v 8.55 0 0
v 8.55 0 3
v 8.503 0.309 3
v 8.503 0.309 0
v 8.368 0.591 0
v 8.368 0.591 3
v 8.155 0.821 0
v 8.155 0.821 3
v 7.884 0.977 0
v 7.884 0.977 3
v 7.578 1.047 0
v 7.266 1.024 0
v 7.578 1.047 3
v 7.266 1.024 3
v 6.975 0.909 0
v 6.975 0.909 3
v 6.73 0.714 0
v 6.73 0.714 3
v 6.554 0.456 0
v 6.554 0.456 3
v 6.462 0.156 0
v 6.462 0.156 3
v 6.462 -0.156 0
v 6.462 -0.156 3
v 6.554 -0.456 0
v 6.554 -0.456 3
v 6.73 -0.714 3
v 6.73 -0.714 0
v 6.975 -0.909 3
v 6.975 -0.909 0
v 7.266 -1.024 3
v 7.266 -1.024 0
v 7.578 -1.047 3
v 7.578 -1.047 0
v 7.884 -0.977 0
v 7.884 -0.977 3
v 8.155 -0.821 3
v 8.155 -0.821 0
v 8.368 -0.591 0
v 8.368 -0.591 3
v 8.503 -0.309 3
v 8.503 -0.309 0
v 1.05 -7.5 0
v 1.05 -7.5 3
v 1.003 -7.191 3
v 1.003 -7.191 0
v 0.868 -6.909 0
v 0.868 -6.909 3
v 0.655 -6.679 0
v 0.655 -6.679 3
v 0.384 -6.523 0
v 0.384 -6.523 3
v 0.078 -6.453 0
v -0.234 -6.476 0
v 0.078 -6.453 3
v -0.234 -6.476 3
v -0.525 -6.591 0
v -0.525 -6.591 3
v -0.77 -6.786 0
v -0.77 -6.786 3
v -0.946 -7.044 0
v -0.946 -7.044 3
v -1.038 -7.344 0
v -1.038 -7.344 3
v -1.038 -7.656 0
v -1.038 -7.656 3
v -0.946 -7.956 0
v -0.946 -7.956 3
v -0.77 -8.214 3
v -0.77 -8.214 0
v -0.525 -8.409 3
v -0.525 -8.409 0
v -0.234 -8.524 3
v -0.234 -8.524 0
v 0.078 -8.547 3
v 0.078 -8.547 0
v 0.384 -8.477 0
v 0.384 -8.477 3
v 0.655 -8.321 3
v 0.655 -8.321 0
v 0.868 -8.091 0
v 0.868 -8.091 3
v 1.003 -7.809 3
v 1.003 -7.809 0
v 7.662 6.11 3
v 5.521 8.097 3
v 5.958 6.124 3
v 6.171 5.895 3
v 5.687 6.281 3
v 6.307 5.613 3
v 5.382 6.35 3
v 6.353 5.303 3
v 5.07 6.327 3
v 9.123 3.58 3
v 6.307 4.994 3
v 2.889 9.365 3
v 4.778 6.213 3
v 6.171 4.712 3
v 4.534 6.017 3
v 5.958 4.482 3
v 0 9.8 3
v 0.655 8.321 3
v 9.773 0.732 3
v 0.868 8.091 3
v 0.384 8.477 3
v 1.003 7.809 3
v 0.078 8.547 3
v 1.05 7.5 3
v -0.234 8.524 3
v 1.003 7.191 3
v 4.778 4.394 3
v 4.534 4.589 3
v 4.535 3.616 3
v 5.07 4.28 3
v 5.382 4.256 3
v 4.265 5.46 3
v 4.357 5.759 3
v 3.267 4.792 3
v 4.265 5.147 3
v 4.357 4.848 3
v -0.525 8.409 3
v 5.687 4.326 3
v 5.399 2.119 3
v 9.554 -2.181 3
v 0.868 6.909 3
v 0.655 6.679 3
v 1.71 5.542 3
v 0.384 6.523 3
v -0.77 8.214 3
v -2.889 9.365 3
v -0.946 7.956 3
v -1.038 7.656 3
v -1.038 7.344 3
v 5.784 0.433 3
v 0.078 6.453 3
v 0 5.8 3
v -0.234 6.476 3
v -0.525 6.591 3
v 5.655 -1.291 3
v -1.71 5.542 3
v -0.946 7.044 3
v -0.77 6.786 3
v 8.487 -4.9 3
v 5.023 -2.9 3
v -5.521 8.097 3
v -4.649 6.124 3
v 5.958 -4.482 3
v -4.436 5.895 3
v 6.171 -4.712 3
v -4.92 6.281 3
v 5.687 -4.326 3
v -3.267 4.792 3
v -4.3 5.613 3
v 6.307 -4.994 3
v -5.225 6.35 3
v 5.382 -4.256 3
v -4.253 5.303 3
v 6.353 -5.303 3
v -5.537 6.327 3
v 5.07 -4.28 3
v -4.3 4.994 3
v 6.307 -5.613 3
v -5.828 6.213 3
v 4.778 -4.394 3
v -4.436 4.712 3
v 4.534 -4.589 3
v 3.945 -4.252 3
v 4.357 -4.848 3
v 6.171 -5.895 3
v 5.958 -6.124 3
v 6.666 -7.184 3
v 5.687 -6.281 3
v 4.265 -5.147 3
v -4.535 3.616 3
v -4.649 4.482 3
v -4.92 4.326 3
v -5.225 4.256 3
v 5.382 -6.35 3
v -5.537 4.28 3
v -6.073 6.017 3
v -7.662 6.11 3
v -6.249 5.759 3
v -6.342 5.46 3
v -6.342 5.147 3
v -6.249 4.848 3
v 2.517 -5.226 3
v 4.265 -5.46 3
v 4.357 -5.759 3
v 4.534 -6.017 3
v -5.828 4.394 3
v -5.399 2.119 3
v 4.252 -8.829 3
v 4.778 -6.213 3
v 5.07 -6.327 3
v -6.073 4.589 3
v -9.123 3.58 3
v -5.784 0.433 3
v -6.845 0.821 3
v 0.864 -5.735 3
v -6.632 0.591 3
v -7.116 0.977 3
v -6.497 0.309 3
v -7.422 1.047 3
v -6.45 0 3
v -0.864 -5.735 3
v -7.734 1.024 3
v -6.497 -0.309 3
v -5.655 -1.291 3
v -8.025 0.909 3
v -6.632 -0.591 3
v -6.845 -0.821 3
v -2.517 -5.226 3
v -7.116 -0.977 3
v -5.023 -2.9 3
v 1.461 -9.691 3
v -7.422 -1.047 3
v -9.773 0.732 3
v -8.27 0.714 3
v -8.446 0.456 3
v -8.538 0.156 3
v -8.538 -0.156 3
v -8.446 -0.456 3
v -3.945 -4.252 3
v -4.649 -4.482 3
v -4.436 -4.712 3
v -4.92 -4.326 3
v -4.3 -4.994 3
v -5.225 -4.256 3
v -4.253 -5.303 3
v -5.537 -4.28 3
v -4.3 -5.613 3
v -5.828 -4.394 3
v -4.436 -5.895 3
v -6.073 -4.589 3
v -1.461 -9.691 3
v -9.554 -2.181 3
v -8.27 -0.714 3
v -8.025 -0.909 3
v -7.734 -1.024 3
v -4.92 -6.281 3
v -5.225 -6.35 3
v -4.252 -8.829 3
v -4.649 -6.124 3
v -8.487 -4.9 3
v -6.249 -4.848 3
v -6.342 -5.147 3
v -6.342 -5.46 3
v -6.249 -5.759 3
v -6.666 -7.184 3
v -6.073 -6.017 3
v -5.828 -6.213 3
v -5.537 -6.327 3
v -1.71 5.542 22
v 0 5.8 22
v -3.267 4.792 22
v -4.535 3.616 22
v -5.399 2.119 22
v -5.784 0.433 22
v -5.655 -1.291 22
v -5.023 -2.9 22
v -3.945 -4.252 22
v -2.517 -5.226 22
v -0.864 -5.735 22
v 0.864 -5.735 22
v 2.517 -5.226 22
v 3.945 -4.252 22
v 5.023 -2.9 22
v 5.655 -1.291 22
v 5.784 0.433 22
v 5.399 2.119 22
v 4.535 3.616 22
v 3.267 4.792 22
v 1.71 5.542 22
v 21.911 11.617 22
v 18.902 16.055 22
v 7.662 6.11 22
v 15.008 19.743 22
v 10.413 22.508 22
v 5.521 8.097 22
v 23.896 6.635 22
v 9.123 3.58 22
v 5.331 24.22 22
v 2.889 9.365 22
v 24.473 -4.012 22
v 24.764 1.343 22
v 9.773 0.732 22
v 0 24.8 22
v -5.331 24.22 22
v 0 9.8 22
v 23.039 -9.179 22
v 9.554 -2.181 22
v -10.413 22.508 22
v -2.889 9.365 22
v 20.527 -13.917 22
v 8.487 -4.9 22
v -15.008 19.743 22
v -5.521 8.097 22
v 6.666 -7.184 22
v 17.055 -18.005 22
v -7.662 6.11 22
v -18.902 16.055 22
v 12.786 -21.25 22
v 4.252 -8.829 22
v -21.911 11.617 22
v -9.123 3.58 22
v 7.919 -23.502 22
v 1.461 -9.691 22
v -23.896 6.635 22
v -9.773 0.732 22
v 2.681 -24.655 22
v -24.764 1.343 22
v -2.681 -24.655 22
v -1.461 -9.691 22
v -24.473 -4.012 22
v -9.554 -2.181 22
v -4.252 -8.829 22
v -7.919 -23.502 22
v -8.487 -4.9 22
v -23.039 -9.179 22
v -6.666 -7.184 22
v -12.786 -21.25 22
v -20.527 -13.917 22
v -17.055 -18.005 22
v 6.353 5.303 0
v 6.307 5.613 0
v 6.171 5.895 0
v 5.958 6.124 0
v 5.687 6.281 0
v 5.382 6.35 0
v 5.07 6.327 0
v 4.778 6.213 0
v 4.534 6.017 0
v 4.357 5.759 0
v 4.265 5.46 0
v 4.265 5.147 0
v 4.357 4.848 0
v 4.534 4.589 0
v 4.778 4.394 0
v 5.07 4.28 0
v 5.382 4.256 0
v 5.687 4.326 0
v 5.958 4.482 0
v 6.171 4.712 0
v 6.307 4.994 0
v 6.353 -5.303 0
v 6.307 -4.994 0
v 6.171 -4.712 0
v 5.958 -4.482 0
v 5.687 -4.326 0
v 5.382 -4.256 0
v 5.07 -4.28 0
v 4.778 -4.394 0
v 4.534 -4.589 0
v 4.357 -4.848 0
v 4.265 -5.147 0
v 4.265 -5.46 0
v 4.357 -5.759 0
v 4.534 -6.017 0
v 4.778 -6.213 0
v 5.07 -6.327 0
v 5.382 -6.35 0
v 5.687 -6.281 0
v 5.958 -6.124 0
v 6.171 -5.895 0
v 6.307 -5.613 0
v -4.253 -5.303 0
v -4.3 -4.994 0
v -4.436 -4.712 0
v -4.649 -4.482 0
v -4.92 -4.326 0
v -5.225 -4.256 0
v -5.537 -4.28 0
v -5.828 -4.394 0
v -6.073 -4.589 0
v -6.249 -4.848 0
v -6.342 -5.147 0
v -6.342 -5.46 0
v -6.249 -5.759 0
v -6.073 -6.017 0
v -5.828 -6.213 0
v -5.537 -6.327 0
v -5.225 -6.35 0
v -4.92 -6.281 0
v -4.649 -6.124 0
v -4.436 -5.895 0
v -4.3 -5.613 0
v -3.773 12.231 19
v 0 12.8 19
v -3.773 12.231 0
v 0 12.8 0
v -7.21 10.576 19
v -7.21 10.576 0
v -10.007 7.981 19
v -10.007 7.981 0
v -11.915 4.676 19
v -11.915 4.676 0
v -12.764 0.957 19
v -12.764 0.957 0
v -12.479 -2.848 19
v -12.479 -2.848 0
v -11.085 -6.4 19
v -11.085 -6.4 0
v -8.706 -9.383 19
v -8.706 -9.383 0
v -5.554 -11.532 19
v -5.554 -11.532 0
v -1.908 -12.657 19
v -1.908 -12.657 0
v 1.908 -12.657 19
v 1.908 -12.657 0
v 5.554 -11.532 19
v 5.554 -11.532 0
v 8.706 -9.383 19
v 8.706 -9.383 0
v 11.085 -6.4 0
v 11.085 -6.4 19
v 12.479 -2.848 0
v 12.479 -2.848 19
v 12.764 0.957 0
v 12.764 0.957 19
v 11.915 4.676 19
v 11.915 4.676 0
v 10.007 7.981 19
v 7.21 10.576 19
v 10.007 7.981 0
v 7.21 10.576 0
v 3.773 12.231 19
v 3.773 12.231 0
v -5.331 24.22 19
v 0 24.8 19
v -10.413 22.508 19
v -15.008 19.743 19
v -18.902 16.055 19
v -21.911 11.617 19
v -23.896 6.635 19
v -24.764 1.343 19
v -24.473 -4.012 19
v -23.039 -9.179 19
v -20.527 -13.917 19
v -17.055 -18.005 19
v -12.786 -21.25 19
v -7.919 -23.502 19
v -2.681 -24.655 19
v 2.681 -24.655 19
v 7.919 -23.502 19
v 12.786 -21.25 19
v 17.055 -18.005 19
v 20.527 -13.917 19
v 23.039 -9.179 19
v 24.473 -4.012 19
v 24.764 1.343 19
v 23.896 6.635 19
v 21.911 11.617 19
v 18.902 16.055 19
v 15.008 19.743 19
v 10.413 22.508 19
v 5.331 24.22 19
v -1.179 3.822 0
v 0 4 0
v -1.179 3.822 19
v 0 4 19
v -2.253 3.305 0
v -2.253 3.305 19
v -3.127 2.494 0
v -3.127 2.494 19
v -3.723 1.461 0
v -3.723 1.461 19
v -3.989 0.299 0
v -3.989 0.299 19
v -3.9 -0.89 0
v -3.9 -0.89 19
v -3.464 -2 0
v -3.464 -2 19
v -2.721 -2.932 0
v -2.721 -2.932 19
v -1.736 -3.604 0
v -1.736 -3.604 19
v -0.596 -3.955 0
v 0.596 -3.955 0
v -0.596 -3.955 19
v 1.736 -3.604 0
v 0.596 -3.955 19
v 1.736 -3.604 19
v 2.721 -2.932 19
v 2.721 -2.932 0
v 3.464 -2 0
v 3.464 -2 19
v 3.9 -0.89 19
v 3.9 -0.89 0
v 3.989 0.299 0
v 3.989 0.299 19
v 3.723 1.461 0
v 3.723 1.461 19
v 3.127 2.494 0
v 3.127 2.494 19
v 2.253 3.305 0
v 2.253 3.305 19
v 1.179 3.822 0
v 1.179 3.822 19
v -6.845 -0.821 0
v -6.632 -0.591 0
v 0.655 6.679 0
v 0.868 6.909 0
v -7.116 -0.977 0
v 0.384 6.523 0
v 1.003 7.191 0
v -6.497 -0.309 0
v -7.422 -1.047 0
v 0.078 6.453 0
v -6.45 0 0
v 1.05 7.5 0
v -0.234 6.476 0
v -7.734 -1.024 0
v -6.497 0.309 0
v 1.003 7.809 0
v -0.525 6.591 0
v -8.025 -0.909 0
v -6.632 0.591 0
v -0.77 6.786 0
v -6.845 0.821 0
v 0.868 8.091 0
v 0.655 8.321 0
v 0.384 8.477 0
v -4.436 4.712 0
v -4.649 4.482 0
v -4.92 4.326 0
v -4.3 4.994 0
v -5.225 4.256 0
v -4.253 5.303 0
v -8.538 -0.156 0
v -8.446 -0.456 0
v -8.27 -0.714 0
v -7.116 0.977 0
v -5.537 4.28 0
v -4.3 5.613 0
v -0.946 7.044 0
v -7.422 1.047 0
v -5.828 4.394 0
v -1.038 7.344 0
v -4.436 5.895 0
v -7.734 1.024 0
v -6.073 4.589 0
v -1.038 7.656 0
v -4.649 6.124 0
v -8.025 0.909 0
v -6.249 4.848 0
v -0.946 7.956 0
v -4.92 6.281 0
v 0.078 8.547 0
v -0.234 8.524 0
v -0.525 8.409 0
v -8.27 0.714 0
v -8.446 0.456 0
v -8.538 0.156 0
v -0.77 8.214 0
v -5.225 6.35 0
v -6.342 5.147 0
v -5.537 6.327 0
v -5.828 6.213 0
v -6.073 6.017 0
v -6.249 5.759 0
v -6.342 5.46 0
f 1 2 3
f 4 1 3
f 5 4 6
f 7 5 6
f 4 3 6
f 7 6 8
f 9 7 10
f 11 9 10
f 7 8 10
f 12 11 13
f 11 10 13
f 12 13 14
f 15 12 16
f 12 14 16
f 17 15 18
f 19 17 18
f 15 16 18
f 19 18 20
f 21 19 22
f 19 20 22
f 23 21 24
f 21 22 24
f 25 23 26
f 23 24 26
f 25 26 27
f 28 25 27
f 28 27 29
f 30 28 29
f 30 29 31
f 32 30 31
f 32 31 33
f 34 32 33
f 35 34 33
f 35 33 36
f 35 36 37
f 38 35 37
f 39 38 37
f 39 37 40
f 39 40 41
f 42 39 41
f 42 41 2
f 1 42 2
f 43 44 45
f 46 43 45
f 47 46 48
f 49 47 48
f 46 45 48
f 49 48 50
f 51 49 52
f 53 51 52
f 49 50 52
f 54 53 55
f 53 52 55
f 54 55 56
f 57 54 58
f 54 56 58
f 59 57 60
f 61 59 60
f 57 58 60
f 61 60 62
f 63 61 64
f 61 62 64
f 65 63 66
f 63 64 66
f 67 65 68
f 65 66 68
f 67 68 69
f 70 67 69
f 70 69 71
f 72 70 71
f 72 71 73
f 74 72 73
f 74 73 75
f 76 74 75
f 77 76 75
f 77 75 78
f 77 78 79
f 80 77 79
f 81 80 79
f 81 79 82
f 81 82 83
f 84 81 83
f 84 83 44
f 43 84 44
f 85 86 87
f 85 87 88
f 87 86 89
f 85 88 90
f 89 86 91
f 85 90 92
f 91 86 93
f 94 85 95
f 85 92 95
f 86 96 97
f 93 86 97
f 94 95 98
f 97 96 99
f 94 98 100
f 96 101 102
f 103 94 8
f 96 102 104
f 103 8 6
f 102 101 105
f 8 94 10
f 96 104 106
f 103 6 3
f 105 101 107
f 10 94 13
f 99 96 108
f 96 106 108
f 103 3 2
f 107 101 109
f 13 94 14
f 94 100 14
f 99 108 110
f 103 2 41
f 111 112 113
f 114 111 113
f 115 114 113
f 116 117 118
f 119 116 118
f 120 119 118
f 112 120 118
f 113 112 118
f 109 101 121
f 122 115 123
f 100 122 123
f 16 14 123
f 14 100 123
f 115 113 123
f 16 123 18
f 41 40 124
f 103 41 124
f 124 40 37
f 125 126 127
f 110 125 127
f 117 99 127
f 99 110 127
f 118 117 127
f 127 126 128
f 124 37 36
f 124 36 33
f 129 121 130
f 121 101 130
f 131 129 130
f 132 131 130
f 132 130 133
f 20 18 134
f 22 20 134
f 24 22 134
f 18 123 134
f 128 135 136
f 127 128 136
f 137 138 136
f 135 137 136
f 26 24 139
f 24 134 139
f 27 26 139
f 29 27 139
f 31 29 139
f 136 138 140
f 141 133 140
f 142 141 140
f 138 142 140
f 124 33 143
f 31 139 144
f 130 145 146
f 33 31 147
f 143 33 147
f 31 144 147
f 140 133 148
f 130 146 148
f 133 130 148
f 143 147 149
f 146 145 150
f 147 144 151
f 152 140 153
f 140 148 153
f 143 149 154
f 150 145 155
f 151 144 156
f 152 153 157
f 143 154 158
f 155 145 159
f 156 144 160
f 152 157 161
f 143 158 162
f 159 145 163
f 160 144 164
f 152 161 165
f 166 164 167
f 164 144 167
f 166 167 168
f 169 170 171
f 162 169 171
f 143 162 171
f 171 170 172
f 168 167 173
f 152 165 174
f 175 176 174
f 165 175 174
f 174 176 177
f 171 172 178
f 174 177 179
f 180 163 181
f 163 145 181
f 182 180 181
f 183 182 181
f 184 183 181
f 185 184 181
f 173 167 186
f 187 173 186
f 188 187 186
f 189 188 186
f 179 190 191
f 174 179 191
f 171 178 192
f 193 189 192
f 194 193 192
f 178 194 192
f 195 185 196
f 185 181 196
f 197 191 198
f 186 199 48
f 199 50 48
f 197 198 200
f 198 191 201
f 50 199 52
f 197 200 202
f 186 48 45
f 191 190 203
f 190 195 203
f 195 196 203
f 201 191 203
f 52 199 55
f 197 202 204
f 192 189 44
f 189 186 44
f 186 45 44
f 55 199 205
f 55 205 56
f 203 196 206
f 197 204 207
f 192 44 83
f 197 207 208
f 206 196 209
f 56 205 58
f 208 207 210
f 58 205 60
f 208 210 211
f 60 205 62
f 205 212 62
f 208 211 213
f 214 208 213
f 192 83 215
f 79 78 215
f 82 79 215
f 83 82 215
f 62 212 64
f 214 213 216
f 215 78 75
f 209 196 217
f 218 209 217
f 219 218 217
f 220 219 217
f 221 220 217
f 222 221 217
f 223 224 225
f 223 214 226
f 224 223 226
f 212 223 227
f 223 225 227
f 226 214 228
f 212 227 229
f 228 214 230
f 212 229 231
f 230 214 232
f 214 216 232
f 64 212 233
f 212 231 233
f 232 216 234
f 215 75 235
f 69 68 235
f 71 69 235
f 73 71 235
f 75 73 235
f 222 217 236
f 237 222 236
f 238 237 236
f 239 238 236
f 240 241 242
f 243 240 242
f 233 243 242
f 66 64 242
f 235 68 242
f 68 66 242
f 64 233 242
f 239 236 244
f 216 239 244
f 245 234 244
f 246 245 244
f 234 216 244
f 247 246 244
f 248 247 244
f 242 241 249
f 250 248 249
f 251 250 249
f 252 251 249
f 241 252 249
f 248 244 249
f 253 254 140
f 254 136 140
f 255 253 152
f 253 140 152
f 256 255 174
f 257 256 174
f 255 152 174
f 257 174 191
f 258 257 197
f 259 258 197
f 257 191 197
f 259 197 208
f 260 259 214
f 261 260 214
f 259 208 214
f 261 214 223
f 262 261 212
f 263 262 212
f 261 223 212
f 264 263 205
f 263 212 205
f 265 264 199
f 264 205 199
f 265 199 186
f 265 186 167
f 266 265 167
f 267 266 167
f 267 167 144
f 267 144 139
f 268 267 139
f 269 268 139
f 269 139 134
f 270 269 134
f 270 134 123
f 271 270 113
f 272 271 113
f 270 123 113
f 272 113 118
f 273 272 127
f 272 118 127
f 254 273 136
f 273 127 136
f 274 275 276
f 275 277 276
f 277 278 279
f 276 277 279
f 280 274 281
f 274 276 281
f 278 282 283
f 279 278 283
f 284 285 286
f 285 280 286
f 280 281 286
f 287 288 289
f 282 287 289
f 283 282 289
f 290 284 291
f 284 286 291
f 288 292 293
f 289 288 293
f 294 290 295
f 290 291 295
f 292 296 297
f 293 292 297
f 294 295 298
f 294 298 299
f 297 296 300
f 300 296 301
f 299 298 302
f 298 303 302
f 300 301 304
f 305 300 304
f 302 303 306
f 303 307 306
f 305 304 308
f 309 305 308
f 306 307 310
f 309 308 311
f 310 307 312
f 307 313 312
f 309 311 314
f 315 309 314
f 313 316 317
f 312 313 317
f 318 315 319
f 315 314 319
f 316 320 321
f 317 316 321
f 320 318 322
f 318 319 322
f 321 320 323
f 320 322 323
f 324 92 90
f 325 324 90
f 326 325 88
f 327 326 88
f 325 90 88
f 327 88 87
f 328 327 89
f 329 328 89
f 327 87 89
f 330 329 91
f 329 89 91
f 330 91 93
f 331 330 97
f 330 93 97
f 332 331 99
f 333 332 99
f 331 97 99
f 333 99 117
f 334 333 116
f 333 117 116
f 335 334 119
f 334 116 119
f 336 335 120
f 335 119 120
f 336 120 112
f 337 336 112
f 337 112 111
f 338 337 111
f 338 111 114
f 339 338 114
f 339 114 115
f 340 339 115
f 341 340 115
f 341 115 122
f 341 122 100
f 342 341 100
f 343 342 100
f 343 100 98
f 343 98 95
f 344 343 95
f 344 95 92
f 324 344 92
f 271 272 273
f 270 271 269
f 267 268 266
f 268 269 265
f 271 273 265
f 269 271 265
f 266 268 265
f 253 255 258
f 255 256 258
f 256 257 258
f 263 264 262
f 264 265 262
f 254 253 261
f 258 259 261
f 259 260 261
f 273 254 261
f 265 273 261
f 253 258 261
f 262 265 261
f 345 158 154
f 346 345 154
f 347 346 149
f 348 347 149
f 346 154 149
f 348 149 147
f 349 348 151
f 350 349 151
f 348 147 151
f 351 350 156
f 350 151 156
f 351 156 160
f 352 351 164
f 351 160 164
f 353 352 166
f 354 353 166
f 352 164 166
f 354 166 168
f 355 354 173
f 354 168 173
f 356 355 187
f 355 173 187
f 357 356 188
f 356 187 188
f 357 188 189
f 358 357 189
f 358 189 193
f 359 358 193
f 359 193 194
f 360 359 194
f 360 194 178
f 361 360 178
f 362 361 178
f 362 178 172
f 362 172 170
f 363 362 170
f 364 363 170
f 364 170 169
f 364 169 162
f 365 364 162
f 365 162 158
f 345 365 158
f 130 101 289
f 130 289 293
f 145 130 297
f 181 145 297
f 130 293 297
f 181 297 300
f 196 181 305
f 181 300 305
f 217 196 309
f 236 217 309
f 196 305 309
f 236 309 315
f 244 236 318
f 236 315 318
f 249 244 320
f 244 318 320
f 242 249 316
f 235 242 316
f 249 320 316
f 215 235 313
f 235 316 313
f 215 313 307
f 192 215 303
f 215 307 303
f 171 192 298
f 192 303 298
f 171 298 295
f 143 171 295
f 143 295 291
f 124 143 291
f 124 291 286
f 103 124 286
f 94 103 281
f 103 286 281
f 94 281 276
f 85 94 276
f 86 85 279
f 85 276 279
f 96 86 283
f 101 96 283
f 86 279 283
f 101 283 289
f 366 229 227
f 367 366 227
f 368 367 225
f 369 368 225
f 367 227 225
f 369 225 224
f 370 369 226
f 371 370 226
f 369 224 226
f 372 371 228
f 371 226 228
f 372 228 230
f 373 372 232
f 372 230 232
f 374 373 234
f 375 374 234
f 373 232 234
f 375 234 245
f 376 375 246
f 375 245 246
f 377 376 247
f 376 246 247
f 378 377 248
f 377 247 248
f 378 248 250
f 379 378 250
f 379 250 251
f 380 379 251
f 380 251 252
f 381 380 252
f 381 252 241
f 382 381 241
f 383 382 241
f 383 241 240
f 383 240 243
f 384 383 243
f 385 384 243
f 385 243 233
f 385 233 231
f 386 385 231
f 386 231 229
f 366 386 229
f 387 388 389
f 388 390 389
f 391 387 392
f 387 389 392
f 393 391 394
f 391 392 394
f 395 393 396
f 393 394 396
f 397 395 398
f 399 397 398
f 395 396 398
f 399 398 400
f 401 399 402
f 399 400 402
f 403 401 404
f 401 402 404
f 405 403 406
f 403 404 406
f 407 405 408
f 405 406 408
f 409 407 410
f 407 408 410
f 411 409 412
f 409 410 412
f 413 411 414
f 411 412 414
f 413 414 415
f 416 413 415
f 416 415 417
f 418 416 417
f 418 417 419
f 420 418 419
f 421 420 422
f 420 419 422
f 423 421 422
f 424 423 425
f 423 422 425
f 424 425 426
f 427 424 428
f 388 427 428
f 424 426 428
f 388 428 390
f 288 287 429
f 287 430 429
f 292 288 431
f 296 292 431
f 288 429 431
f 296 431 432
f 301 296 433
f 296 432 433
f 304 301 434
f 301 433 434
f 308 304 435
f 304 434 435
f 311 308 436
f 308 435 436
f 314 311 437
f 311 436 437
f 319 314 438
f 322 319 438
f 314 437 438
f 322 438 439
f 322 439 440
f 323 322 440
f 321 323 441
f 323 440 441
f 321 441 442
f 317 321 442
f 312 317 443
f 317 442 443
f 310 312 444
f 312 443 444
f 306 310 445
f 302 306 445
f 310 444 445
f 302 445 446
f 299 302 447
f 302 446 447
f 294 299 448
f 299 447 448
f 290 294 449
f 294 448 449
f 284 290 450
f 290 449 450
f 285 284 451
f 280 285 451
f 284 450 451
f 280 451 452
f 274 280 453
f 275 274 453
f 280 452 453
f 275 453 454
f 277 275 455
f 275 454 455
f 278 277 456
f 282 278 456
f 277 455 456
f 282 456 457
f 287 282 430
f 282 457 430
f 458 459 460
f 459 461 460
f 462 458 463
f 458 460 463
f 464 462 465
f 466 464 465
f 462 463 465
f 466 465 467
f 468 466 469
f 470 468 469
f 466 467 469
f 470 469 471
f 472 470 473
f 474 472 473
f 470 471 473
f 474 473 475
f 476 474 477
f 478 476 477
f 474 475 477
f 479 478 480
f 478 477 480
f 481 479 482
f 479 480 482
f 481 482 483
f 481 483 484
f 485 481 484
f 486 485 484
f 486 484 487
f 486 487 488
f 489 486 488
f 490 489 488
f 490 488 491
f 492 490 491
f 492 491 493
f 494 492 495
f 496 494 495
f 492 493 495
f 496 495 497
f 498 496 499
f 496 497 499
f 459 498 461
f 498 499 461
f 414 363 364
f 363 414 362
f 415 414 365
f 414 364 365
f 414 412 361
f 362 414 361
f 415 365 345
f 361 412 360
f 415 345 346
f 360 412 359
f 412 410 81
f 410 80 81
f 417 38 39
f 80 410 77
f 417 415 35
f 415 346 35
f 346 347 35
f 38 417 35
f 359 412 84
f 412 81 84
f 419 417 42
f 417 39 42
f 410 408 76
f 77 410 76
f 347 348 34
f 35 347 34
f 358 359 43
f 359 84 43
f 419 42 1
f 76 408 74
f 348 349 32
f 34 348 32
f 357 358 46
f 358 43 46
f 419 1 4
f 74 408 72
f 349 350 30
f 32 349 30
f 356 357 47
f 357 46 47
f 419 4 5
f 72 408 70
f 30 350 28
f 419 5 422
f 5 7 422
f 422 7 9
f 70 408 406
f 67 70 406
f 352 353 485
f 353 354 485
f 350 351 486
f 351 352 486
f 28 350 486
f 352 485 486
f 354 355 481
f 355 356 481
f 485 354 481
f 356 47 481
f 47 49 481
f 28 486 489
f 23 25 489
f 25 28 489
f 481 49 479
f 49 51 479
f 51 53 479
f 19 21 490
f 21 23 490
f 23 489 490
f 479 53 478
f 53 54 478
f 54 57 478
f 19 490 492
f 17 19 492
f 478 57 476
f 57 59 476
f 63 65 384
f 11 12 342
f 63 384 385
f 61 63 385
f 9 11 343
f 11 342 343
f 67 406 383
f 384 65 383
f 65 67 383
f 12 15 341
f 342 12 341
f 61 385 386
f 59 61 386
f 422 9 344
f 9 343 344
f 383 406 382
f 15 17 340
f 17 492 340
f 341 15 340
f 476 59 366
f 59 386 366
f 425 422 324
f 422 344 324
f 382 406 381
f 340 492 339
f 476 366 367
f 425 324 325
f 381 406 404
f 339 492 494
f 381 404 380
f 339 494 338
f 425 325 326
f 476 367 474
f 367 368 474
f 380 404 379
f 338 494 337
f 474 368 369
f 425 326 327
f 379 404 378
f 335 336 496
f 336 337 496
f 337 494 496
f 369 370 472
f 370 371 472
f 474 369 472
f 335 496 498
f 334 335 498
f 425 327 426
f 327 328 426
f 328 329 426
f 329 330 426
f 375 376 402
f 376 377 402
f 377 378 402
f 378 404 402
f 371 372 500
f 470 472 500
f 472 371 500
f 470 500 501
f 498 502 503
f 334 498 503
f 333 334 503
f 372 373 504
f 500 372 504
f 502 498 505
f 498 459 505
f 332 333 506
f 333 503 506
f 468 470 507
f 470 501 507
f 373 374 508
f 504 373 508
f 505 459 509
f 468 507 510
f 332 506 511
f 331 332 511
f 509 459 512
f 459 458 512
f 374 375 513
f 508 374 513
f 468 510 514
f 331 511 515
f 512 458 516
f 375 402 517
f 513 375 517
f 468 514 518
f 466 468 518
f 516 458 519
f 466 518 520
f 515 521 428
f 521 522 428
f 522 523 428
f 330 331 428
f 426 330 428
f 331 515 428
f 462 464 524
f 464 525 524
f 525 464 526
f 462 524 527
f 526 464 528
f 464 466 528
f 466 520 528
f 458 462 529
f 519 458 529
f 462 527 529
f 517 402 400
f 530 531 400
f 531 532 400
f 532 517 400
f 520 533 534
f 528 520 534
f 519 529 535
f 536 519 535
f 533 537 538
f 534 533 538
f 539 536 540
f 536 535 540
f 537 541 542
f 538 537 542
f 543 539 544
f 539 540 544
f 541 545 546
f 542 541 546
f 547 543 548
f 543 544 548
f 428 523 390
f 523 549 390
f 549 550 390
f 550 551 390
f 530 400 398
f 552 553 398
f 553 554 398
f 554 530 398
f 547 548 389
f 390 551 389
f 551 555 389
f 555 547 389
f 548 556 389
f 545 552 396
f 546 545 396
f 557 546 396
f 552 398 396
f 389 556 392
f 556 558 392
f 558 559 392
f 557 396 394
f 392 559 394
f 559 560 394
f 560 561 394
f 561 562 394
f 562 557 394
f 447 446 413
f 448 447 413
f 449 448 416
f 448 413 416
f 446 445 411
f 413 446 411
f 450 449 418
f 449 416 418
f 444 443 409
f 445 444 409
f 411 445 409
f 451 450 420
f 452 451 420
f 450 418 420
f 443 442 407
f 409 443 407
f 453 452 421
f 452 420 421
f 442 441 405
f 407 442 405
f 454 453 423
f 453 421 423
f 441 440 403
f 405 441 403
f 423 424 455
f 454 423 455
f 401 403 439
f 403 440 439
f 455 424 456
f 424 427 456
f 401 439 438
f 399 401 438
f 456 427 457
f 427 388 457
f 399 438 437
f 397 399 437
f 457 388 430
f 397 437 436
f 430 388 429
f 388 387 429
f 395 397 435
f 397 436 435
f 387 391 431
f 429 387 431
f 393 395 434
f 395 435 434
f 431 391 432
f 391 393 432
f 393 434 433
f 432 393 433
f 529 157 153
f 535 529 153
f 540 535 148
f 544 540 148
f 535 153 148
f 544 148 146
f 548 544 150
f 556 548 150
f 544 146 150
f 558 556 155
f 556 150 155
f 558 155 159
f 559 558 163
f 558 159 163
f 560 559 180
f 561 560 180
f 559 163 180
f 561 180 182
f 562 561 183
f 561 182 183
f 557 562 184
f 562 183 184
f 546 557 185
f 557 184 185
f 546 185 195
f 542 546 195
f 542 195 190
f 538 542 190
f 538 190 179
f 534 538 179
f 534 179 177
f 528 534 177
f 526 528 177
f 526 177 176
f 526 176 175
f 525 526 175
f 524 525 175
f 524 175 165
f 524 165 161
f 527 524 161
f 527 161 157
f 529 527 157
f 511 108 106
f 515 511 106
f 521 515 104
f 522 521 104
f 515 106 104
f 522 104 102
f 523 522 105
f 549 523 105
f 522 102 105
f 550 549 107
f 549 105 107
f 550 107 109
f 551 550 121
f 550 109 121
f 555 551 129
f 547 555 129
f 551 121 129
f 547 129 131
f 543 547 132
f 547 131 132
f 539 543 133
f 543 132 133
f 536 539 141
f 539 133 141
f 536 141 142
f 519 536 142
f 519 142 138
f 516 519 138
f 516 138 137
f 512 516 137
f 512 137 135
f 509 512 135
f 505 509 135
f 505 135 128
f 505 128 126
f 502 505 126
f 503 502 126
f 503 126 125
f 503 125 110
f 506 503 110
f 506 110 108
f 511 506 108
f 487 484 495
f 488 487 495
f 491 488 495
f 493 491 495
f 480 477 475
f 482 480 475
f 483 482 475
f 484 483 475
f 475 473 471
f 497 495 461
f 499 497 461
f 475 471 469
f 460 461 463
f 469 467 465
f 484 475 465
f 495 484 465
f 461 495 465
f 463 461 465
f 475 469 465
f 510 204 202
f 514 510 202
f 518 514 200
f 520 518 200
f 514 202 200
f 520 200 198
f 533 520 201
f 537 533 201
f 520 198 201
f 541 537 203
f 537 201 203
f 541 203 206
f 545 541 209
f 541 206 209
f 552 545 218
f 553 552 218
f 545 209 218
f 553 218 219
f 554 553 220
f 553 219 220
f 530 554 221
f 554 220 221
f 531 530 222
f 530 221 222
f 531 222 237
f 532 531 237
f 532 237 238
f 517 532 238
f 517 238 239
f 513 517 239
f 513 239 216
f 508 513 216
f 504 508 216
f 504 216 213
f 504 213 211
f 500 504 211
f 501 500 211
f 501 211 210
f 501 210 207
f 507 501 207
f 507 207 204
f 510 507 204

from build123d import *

# Parameters (mm, degrees)
SKETCH4_R          = 1.05
CUT_EXTRUDE1_DEPTH = 4


with BuildPart() as part:
    # Sketch2 → Revolve1 (revolve)
    with BuildSketch(Plane(origin=(0, 0, 0), x_dir=(0, 0, -1), z_dir=(1, 0, 0))):
        Polygon((-22, 0), (-22, 5.8), (-3, 5.8), (-3, 9.8), (-22, 9.8), (-22, 24.8), (-19, 24.8), (-19, 12.8), (0, 12.8), (0, 4), (-19, 4), (-19, 0), align=None)
    revolve(axis=Axis((0, 0, 0), (0, 0, 1)))

    # Sketch4 → Cut-Extrude1 (cut, through all)
    with BuildSketch(Plane.XY.offset(3)):
        with Locations((0, 7.5)):
            Circle(SKETCH4_R)
        with Locations((5.303300859, 5.303300859)):
            Circle(SKETCH4_R)
        with Locations((7.5, 0)):
            Circle(SKETCH4_R)
        with Locations((5.303300859, -5.303300859)):
            Circle(SKETCH4_R)
        with Locations((0, -7.5)):
            Circle(SKETCH4_R)
        with Locations((-5.303300859, -5.303300859)):
            Circle(SKETCH4_R)
        with Locations((-7.5, 0)):
            Circle(SKETCH4_R)
        with Locations((-5.303300859, 5.303300859)):
            Circle(SKETCH4_R)
    extrude(amount=-CUT_EXTRUDE1_DEPTH, mode=Mode.SUBTRACT)


solid = part.part
